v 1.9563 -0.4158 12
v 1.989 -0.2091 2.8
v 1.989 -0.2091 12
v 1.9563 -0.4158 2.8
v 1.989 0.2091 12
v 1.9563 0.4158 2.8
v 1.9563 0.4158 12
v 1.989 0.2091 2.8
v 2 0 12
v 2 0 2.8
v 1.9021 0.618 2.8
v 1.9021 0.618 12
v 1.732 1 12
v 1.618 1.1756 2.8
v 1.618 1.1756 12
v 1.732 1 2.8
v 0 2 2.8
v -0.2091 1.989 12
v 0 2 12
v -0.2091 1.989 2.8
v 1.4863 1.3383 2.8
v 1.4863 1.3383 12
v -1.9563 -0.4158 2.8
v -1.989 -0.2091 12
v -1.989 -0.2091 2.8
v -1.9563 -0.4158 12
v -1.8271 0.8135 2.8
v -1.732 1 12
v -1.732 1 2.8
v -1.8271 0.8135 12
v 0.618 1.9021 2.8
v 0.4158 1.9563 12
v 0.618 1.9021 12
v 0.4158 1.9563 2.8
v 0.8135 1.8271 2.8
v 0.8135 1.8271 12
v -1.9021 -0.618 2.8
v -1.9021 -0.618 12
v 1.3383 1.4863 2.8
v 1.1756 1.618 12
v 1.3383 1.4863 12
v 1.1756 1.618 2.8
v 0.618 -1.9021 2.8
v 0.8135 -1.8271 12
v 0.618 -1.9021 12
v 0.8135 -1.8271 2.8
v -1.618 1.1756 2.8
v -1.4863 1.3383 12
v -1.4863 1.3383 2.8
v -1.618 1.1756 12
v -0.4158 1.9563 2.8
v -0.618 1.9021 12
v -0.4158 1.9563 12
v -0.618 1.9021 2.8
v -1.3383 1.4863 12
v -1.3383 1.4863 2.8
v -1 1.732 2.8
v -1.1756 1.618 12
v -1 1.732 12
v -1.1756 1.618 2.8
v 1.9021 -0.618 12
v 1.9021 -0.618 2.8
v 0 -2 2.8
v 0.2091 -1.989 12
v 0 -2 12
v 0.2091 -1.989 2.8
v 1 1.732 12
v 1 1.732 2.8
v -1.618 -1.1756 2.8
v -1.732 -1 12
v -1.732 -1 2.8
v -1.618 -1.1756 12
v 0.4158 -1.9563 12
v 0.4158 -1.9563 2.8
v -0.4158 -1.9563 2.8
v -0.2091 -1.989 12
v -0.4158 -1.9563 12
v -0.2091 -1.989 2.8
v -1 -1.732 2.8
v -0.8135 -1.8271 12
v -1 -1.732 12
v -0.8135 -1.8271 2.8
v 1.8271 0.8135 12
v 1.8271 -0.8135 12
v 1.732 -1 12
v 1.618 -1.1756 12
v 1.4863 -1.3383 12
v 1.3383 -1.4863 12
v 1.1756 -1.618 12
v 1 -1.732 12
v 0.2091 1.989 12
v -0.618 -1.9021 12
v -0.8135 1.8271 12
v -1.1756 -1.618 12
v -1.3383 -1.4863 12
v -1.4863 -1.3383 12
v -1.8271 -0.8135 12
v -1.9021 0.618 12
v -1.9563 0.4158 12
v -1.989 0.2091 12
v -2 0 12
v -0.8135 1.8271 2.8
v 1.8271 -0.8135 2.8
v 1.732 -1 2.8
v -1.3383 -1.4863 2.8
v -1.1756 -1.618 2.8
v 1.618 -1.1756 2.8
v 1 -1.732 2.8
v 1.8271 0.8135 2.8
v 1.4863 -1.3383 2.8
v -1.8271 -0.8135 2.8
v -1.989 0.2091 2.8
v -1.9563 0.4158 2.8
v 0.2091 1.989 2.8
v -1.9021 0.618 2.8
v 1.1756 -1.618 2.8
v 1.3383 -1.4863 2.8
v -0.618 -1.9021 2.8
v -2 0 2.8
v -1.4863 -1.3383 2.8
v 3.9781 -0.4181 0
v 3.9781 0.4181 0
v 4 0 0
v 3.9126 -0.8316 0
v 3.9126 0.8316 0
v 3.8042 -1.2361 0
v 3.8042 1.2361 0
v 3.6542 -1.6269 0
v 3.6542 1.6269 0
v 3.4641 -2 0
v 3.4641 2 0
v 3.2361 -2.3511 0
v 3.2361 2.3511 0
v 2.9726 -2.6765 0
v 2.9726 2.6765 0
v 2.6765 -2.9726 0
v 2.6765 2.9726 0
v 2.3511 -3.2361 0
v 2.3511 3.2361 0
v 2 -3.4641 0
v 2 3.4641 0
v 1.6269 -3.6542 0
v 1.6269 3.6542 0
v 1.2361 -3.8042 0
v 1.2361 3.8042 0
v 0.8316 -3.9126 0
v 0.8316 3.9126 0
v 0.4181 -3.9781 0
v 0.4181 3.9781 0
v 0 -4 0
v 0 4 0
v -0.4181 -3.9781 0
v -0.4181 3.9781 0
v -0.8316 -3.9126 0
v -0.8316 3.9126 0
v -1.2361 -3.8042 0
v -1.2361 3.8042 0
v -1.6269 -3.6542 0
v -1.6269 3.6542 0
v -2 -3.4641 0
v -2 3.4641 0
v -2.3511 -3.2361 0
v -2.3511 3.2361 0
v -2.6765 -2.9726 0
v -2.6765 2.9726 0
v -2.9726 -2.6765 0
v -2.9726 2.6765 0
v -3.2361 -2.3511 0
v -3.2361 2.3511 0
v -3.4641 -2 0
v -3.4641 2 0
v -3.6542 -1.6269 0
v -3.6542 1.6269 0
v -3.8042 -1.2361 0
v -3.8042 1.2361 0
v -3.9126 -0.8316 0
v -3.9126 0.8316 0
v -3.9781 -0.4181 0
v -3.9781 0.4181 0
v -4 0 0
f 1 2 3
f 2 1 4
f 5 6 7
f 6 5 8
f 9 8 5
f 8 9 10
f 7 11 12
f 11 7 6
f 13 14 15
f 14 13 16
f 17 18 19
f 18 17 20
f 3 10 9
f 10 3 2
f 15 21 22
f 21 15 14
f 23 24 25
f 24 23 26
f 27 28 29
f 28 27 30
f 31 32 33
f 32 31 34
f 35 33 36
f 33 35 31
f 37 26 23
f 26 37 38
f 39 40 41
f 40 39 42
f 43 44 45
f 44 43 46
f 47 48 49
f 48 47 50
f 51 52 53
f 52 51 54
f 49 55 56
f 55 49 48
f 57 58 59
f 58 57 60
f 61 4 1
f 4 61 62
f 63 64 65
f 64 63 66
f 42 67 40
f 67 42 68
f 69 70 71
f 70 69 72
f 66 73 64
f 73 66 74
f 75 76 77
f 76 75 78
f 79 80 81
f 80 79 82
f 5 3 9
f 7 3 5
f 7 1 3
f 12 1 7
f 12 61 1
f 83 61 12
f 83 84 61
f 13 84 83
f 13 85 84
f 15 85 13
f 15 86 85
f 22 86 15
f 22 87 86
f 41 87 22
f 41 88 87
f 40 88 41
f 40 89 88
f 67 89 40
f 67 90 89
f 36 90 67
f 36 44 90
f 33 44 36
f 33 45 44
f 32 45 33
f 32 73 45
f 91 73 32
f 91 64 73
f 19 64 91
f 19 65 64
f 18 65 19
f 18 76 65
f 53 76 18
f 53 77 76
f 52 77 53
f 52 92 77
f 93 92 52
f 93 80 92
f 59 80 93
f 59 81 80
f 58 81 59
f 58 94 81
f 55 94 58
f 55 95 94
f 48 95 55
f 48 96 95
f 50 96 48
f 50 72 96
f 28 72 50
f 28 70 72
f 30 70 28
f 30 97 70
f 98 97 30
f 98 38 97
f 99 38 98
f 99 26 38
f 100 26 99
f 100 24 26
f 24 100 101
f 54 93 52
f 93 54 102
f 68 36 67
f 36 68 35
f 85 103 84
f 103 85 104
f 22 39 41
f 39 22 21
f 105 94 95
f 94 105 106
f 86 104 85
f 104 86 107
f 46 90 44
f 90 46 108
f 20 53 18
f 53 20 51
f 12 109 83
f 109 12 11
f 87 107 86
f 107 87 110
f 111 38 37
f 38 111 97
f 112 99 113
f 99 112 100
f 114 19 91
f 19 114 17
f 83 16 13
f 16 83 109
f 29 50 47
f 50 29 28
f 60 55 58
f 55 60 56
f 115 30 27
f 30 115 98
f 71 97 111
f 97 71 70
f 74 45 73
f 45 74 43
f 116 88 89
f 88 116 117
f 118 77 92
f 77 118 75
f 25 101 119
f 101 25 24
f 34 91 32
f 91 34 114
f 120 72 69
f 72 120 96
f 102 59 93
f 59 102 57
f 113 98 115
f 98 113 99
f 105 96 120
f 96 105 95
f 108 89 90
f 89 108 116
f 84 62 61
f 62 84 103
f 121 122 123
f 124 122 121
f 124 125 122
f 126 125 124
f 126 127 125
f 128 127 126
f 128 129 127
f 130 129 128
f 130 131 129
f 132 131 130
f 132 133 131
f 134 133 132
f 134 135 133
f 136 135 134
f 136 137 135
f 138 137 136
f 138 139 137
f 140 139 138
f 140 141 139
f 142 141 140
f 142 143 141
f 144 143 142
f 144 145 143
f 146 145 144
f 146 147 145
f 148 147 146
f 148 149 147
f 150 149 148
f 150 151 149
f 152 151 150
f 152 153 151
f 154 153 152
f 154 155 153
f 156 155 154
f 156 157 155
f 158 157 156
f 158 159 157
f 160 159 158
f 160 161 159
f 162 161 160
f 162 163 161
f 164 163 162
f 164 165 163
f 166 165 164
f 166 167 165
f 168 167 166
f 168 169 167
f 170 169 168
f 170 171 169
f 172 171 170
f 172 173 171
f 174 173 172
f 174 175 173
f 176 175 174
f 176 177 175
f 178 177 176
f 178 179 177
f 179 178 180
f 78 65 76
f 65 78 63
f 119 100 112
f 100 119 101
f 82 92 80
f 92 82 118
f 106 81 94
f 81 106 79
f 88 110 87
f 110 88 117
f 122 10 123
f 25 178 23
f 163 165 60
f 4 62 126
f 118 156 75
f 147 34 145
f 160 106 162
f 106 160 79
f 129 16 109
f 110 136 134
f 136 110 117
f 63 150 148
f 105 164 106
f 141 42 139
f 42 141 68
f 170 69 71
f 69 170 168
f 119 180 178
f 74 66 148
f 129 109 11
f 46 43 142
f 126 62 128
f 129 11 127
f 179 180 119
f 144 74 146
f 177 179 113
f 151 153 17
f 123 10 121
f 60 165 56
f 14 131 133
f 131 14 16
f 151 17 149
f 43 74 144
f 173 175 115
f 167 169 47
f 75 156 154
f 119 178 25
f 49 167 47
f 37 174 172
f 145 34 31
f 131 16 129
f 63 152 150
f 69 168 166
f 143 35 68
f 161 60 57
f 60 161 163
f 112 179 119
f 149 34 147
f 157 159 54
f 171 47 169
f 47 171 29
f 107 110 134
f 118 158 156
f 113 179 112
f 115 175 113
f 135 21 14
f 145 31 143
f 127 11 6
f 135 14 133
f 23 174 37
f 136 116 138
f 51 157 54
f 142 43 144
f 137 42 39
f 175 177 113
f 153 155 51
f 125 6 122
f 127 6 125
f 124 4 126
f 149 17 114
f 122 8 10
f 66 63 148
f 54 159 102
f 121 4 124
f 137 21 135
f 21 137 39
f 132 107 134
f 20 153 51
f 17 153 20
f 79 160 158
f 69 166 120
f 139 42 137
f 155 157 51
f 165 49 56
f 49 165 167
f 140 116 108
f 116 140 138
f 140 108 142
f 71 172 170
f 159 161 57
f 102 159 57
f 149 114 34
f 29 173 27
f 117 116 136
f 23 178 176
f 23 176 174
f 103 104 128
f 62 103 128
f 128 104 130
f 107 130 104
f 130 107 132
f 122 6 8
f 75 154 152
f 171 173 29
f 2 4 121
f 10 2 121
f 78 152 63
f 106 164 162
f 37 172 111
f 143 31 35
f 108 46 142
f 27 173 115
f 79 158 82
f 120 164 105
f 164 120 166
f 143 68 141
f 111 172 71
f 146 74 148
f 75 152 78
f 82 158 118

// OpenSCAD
// Solid rivet.
$fn = 60;
eps = 0.02;
shank_d = 4;
head_d = 8;
length = 12;
union() { cylinder(d=shank_d,h=length); cylinder(d1=head_d,d2=shank_d,h=head_d*0.35); }
